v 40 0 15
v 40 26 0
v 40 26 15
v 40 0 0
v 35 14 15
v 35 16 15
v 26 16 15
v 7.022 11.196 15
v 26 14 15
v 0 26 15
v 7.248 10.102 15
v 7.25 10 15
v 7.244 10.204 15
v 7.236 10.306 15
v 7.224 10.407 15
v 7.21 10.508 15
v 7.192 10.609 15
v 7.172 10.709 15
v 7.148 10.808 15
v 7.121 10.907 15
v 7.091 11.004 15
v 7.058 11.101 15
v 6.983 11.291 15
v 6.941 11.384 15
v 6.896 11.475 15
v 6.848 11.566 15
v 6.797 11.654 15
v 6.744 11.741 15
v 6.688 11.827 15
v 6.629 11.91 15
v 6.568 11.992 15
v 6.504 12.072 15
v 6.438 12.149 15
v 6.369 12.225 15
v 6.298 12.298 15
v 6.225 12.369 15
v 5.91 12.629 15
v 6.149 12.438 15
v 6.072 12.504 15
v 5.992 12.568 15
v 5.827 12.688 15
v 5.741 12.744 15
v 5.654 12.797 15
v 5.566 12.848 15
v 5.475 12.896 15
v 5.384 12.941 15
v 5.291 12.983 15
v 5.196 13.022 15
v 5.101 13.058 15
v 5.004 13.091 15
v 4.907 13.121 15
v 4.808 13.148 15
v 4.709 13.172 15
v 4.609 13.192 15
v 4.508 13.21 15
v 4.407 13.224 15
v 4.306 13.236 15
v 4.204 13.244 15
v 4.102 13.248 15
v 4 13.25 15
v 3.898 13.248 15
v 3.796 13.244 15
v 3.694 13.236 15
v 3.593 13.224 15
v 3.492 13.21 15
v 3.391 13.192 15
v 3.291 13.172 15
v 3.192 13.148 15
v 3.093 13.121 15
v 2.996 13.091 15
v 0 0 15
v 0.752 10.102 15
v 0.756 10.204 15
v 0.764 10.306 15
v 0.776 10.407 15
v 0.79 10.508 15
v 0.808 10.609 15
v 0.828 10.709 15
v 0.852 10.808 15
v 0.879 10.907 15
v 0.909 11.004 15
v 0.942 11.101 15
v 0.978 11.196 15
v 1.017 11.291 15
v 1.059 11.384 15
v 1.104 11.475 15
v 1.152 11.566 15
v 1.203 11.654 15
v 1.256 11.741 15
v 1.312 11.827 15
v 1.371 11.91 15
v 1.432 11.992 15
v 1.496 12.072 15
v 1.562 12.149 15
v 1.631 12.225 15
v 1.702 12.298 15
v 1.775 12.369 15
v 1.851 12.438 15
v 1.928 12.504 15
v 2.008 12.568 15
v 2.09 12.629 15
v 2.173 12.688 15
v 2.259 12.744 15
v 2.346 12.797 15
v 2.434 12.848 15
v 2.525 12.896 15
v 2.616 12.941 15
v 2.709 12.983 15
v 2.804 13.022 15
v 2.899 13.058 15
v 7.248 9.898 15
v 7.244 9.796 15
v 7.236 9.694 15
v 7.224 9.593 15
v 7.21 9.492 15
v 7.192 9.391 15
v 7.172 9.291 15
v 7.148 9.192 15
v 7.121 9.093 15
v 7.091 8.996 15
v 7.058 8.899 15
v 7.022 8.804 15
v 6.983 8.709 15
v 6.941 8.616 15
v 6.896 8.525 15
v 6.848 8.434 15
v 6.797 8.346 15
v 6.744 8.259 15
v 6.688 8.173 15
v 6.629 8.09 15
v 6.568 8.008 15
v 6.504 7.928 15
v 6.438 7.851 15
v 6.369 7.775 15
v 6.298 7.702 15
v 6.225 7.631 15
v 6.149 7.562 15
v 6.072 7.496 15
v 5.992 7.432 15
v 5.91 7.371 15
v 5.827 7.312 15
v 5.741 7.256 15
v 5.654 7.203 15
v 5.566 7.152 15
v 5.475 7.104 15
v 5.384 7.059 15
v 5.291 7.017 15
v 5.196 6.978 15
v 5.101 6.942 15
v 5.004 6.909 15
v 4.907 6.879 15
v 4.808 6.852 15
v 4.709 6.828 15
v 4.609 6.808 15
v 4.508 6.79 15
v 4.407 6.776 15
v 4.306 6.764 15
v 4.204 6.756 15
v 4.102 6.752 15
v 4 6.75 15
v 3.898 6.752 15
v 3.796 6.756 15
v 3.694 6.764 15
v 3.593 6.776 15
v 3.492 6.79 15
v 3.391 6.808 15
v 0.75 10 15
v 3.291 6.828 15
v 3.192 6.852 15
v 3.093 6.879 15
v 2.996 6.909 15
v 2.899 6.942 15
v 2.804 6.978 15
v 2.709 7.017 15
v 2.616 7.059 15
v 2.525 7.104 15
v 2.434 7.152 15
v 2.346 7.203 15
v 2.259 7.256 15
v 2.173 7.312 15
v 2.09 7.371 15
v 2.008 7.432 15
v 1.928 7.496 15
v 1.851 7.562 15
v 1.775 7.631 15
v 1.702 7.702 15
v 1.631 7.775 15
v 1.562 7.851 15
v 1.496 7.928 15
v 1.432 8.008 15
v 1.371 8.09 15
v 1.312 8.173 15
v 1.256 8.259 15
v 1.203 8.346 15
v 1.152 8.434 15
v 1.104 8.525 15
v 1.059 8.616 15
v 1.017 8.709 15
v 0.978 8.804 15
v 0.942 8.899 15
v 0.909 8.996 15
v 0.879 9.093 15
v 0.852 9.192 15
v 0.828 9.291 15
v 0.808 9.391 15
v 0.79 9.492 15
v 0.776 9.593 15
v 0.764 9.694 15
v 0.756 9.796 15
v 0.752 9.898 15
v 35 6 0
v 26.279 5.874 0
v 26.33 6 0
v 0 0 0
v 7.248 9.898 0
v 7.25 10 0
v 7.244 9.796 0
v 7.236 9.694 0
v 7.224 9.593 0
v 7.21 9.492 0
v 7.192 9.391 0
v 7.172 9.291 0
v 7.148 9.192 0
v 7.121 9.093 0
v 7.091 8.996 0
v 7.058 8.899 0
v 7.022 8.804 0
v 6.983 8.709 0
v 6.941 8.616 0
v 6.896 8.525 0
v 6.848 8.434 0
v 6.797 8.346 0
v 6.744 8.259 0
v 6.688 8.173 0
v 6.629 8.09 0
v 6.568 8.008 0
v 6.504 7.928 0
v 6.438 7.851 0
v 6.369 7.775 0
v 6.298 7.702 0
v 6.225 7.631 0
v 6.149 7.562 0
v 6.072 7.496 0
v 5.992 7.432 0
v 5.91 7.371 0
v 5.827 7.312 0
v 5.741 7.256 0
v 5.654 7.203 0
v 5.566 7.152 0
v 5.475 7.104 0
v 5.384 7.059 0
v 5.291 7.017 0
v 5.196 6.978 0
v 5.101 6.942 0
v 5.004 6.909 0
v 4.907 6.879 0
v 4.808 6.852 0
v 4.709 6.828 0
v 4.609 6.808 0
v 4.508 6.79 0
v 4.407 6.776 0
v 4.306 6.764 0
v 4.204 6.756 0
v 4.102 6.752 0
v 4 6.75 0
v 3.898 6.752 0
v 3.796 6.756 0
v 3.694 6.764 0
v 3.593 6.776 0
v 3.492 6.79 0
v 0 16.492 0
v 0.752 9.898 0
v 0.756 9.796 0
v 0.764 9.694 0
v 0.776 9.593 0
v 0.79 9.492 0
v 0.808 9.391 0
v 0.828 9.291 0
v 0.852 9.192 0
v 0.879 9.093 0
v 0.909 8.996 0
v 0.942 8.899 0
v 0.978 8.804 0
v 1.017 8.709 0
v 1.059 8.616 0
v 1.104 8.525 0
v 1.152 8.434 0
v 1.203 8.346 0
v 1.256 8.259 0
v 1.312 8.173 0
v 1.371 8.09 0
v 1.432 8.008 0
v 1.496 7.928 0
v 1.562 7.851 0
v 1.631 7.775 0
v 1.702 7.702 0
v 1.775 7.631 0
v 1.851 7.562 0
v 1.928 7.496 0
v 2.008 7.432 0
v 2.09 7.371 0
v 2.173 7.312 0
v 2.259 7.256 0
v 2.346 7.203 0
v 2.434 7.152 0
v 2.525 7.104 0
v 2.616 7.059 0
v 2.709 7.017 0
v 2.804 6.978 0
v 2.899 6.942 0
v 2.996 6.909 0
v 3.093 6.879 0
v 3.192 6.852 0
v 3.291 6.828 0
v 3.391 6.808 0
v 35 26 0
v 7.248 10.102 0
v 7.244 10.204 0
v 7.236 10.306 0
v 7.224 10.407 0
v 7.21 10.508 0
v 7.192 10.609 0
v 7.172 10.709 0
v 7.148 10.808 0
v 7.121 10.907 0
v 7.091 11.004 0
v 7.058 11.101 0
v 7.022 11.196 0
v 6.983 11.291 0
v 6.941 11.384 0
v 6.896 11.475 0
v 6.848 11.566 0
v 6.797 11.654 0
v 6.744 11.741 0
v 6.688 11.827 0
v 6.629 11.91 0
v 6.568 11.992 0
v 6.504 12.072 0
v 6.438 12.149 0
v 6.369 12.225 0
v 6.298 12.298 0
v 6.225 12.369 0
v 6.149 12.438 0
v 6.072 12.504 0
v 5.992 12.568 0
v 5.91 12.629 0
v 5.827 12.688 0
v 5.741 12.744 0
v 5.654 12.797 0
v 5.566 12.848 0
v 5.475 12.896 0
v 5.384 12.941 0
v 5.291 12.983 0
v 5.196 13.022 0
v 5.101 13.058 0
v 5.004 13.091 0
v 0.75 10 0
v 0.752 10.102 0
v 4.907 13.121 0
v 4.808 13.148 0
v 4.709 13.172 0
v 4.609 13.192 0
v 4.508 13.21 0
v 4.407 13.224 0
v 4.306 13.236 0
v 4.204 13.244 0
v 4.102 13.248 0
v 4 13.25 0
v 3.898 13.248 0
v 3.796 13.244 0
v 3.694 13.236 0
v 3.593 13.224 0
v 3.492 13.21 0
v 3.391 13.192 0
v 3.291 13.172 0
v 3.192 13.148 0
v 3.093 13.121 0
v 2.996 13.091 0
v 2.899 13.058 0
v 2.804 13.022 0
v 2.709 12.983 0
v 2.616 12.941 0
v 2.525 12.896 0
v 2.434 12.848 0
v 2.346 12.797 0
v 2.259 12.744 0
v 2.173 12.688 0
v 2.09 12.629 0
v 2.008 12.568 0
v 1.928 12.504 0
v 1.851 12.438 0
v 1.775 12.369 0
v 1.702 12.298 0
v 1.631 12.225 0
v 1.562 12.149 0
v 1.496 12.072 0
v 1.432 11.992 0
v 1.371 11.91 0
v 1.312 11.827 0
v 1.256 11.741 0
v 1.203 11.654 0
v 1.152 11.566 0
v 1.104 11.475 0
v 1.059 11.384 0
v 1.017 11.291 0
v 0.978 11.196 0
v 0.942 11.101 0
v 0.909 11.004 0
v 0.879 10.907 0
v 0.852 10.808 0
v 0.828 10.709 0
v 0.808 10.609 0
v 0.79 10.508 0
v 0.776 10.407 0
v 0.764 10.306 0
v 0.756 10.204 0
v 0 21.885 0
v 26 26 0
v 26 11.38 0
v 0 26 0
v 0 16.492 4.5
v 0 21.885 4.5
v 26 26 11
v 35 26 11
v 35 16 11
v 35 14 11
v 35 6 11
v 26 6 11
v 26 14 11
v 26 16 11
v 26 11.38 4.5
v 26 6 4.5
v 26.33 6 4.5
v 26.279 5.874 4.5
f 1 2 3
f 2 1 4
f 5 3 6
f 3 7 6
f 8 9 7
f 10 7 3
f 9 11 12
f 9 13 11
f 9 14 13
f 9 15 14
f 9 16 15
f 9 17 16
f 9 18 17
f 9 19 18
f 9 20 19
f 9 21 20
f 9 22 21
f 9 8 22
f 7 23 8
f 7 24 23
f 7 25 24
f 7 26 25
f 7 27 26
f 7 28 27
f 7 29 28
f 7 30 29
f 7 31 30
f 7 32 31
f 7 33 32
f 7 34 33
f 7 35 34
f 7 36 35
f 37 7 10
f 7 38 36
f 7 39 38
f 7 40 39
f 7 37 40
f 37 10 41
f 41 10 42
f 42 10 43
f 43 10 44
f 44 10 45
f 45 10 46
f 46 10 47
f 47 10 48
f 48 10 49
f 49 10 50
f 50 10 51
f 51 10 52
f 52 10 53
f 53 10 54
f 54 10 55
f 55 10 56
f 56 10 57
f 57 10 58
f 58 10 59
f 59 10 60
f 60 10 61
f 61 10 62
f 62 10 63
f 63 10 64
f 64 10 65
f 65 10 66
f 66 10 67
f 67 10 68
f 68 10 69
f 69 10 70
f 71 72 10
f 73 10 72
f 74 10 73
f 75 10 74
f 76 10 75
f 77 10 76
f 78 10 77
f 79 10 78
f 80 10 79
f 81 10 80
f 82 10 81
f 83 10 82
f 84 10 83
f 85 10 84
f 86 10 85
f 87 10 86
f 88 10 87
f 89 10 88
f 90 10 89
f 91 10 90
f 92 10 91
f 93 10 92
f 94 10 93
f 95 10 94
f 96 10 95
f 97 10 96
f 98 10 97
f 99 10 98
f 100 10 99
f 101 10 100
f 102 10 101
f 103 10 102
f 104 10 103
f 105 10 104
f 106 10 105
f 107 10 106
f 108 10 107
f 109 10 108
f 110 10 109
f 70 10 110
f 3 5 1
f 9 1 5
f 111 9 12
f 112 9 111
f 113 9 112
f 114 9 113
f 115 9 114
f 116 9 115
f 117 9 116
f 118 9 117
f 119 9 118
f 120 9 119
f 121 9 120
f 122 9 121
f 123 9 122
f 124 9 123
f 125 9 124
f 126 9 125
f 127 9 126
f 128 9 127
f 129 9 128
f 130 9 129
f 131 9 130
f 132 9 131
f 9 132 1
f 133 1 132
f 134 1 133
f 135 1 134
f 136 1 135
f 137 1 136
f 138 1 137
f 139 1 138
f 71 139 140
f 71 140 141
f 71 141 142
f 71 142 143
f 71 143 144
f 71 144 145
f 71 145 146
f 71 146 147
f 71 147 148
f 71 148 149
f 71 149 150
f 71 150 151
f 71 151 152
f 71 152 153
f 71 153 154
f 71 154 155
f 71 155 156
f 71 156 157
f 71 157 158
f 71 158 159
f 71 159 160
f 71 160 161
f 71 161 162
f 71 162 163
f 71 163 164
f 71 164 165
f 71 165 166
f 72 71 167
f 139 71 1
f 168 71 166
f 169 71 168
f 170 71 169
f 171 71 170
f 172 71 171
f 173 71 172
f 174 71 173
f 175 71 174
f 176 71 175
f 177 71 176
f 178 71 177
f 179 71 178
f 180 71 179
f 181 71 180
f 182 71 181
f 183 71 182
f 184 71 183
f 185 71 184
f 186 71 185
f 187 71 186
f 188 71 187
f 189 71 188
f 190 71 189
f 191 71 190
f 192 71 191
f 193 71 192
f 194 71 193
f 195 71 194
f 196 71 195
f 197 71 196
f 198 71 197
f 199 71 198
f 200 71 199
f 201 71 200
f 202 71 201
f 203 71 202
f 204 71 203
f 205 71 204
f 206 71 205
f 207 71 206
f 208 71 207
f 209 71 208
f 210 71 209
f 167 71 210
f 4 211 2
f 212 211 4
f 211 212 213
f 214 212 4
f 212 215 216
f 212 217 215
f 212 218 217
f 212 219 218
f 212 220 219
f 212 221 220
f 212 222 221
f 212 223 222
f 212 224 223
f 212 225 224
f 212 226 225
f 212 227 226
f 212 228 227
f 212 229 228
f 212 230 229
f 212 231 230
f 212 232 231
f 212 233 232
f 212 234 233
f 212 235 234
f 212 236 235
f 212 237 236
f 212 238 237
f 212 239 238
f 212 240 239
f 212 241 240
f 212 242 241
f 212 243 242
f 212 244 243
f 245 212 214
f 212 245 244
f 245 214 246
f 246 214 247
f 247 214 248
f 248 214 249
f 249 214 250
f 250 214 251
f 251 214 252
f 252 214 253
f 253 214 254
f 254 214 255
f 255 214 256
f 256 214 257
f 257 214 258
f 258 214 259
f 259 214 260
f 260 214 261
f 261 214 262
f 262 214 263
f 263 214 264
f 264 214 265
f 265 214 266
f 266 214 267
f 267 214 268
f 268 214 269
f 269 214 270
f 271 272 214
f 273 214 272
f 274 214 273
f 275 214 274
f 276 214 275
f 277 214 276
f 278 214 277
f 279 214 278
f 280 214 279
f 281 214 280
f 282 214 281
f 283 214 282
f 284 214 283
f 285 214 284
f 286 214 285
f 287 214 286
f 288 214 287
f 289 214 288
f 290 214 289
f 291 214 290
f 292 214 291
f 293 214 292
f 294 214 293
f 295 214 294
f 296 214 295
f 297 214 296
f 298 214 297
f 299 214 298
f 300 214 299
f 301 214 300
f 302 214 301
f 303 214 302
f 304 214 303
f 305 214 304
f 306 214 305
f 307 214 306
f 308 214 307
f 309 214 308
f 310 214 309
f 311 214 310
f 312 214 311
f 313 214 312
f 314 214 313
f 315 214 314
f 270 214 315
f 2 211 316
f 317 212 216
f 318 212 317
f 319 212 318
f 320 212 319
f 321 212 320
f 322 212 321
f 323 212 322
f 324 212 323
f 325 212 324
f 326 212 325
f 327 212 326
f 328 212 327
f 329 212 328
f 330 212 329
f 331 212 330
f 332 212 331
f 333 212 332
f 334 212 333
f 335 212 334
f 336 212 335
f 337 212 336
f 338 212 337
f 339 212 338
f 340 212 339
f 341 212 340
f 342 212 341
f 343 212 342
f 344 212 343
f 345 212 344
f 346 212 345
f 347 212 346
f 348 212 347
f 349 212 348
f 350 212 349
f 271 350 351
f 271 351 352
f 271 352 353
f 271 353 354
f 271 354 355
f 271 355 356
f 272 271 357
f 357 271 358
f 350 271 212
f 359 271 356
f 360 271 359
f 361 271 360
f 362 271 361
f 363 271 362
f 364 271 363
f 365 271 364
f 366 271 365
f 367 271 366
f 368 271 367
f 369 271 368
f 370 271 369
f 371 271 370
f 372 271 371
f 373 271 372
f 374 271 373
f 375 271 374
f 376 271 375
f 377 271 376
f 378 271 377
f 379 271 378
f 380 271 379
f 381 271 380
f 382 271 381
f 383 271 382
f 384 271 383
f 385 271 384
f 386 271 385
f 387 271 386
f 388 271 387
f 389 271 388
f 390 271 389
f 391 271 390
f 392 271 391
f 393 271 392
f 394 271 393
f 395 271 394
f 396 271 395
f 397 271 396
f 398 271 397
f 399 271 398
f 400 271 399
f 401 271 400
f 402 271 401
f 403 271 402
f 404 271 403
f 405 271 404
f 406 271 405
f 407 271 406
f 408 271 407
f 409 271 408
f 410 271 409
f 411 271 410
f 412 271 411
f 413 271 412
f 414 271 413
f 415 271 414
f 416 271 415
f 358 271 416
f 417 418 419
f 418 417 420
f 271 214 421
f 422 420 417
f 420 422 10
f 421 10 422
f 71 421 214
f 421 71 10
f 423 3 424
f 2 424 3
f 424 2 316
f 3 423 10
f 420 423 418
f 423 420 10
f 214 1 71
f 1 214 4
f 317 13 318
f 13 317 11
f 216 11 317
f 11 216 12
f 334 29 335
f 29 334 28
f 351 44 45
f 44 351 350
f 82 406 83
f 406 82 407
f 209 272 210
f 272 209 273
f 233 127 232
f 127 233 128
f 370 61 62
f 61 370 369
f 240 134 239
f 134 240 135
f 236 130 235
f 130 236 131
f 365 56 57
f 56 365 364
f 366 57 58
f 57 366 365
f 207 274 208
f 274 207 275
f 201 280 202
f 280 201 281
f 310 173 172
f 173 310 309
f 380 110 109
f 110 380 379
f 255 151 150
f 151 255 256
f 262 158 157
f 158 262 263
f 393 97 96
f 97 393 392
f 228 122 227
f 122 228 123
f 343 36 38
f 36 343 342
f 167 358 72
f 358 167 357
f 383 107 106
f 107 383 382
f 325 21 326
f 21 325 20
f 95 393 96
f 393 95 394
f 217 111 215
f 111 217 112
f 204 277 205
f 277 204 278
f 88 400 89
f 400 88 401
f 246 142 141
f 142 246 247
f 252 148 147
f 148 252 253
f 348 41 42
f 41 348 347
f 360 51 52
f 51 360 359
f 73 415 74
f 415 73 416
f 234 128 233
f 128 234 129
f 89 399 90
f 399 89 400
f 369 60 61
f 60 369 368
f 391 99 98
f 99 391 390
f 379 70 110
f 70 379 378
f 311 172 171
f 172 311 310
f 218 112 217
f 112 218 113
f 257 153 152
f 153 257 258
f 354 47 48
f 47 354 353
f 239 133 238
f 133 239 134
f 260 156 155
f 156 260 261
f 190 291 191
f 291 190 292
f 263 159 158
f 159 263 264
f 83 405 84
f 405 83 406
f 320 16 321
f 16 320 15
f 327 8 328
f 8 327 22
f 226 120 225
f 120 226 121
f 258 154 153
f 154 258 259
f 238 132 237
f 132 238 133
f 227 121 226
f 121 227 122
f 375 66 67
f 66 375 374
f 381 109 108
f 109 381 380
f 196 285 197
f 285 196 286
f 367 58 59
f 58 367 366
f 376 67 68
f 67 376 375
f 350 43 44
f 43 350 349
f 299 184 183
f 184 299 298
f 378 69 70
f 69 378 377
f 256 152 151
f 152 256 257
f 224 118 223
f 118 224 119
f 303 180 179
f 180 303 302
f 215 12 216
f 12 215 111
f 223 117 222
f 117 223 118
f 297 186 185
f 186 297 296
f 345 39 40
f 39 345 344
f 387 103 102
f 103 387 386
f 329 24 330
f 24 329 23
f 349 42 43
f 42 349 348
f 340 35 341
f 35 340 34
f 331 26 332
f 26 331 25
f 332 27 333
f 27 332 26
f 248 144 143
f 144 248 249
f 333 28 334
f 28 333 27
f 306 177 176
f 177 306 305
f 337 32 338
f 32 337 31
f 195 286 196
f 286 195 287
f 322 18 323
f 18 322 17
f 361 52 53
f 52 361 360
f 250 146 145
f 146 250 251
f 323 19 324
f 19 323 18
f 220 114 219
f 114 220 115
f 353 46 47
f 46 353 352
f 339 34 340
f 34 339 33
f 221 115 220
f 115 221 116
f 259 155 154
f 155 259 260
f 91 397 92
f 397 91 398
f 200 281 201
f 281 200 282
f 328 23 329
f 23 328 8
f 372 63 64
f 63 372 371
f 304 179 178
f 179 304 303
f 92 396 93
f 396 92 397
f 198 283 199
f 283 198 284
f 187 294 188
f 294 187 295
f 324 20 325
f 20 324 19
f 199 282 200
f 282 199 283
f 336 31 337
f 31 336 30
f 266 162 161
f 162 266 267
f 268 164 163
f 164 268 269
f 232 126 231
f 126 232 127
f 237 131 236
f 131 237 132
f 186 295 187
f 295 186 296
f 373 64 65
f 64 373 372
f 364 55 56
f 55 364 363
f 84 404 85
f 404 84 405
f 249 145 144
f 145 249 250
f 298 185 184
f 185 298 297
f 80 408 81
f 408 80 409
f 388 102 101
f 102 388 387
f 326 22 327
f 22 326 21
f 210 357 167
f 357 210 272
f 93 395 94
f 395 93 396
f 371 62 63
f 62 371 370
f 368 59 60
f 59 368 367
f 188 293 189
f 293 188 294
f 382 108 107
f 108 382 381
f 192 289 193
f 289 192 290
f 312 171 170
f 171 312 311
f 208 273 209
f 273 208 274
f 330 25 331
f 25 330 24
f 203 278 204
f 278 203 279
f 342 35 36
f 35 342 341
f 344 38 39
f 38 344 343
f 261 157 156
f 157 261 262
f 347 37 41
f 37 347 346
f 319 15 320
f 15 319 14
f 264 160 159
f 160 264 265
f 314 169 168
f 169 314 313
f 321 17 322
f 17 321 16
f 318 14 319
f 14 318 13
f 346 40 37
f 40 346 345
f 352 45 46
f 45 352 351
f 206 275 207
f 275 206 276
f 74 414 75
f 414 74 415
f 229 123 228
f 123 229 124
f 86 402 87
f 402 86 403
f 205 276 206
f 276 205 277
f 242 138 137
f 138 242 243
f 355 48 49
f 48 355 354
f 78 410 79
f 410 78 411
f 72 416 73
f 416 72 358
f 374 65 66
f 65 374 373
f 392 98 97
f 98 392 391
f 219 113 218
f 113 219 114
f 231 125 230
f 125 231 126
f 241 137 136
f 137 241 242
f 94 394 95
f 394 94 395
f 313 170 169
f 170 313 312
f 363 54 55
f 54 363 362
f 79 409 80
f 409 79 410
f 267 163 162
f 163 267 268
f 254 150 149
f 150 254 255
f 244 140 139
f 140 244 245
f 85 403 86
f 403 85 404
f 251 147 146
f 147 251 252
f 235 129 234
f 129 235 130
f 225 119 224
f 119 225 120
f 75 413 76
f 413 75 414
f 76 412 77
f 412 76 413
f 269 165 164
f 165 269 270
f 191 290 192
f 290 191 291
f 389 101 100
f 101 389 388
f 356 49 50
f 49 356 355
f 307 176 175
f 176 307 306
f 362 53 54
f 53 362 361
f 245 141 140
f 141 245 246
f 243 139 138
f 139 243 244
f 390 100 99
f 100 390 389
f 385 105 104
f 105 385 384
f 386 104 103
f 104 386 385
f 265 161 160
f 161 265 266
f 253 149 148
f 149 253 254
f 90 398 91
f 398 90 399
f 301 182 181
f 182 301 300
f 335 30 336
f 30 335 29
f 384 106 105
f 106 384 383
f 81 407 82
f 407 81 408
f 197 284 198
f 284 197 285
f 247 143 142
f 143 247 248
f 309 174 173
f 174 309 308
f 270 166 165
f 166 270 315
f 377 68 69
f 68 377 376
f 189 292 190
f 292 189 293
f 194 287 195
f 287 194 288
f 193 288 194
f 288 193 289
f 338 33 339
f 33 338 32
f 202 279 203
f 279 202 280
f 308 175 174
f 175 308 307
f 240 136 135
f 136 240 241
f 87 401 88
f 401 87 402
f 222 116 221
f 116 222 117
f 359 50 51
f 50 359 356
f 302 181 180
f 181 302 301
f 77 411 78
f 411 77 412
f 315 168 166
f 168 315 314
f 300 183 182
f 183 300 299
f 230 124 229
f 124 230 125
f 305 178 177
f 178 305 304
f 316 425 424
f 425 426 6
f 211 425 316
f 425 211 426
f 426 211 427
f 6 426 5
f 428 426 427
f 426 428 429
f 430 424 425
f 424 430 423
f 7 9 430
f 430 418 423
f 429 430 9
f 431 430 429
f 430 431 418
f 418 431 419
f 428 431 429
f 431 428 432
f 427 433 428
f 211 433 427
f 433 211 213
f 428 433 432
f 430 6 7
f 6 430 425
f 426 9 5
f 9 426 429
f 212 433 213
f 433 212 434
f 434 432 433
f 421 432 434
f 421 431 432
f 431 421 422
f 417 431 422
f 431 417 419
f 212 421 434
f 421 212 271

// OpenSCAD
difference() {
    cube([40,26,15]);
    translate([4,10,-1]) cylinder(d=6.5,h=17,$fn=200);
    translate([26,6,-1]) cube([9,21,12]);
    translate([26,14,10.5]) cube([9,2,5]);
    translate([-2,17.3,-0.5]) rotate([0,0,-22]) cube([30.5,5,5]);
}
